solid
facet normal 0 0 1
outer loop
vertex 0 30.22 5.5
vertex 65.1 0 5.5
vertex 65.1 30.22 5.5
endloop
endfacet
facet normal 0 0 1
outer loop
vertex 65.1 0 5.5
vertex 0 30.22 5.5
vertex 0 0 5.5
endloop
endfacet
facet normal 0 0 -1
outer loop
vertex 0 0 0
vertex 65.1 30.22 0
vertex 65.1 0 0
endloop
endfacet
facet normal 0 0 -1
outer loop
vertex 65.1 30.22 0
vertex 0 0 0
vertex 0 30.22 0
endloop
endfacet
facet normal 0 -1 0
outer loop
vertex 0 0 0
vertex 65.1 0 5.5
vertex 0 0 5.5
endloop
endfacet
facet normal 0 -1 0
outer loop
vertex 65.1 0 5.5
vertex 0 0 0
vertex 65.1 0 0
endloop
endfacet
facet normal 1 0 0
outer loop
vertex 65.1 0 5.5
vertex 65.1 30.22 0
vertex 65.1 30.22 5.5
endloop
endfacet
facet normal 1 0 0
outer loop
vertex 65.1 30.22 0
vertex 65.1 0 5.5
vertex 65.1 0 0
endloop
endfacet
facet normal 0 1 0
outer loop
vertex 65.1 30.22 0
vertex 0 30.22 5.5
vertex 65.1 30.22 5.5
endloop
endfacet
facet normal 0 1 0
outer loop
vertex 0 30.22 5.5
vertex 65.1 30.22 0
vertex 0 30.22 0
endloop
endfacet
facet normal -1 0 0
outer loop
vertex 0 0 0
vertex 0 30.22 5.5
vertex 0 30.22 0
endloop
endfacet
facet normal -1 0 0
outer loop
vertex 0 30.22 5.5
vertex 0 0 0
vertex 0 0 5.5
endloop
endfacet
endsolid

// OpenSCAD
// measurements
jack_diameter = 8.42;
dist_outer = 23.45;
dist_inner = dist_outer - jack_diameter;

dist_edge_outer = 23.25 - 1.5;
dist_edge_inner = 13.29;
dist_edge = ((dist_edge_outer - jack_diameter / 2) + (dist_edge_inner + jack_diameter / 2)) / 2;

dist_edge_upper = 3.26;
dist_edge_lower = 11.93;
dist_edge_y = ((dist_edge_lower - jack_diameter / 2) + (dist_edge_upper + jack_diameter / 2)) / 2;

//          dist_edge
//  -------------
// |     x   x  | h
//  -------------
//

screw_dia = 2.4;
scew_dist_top = 13.35;
screw_dist_side = 4.8;

thickness = 5.5;
n_cols = 3;


base();


module base() { 
    h1 = dist_edge_y + jack_diameter/2 + dist_inner - jack_diameter + jack_diameter / 2 + dist_edge_y;
    w1 = dist_edge*2 + dist_inner * (n_cols - 1);
    echo(w1);
    echo(h1);
    echo(h1*2);
    cube([w1, h1, thickness]);
}
